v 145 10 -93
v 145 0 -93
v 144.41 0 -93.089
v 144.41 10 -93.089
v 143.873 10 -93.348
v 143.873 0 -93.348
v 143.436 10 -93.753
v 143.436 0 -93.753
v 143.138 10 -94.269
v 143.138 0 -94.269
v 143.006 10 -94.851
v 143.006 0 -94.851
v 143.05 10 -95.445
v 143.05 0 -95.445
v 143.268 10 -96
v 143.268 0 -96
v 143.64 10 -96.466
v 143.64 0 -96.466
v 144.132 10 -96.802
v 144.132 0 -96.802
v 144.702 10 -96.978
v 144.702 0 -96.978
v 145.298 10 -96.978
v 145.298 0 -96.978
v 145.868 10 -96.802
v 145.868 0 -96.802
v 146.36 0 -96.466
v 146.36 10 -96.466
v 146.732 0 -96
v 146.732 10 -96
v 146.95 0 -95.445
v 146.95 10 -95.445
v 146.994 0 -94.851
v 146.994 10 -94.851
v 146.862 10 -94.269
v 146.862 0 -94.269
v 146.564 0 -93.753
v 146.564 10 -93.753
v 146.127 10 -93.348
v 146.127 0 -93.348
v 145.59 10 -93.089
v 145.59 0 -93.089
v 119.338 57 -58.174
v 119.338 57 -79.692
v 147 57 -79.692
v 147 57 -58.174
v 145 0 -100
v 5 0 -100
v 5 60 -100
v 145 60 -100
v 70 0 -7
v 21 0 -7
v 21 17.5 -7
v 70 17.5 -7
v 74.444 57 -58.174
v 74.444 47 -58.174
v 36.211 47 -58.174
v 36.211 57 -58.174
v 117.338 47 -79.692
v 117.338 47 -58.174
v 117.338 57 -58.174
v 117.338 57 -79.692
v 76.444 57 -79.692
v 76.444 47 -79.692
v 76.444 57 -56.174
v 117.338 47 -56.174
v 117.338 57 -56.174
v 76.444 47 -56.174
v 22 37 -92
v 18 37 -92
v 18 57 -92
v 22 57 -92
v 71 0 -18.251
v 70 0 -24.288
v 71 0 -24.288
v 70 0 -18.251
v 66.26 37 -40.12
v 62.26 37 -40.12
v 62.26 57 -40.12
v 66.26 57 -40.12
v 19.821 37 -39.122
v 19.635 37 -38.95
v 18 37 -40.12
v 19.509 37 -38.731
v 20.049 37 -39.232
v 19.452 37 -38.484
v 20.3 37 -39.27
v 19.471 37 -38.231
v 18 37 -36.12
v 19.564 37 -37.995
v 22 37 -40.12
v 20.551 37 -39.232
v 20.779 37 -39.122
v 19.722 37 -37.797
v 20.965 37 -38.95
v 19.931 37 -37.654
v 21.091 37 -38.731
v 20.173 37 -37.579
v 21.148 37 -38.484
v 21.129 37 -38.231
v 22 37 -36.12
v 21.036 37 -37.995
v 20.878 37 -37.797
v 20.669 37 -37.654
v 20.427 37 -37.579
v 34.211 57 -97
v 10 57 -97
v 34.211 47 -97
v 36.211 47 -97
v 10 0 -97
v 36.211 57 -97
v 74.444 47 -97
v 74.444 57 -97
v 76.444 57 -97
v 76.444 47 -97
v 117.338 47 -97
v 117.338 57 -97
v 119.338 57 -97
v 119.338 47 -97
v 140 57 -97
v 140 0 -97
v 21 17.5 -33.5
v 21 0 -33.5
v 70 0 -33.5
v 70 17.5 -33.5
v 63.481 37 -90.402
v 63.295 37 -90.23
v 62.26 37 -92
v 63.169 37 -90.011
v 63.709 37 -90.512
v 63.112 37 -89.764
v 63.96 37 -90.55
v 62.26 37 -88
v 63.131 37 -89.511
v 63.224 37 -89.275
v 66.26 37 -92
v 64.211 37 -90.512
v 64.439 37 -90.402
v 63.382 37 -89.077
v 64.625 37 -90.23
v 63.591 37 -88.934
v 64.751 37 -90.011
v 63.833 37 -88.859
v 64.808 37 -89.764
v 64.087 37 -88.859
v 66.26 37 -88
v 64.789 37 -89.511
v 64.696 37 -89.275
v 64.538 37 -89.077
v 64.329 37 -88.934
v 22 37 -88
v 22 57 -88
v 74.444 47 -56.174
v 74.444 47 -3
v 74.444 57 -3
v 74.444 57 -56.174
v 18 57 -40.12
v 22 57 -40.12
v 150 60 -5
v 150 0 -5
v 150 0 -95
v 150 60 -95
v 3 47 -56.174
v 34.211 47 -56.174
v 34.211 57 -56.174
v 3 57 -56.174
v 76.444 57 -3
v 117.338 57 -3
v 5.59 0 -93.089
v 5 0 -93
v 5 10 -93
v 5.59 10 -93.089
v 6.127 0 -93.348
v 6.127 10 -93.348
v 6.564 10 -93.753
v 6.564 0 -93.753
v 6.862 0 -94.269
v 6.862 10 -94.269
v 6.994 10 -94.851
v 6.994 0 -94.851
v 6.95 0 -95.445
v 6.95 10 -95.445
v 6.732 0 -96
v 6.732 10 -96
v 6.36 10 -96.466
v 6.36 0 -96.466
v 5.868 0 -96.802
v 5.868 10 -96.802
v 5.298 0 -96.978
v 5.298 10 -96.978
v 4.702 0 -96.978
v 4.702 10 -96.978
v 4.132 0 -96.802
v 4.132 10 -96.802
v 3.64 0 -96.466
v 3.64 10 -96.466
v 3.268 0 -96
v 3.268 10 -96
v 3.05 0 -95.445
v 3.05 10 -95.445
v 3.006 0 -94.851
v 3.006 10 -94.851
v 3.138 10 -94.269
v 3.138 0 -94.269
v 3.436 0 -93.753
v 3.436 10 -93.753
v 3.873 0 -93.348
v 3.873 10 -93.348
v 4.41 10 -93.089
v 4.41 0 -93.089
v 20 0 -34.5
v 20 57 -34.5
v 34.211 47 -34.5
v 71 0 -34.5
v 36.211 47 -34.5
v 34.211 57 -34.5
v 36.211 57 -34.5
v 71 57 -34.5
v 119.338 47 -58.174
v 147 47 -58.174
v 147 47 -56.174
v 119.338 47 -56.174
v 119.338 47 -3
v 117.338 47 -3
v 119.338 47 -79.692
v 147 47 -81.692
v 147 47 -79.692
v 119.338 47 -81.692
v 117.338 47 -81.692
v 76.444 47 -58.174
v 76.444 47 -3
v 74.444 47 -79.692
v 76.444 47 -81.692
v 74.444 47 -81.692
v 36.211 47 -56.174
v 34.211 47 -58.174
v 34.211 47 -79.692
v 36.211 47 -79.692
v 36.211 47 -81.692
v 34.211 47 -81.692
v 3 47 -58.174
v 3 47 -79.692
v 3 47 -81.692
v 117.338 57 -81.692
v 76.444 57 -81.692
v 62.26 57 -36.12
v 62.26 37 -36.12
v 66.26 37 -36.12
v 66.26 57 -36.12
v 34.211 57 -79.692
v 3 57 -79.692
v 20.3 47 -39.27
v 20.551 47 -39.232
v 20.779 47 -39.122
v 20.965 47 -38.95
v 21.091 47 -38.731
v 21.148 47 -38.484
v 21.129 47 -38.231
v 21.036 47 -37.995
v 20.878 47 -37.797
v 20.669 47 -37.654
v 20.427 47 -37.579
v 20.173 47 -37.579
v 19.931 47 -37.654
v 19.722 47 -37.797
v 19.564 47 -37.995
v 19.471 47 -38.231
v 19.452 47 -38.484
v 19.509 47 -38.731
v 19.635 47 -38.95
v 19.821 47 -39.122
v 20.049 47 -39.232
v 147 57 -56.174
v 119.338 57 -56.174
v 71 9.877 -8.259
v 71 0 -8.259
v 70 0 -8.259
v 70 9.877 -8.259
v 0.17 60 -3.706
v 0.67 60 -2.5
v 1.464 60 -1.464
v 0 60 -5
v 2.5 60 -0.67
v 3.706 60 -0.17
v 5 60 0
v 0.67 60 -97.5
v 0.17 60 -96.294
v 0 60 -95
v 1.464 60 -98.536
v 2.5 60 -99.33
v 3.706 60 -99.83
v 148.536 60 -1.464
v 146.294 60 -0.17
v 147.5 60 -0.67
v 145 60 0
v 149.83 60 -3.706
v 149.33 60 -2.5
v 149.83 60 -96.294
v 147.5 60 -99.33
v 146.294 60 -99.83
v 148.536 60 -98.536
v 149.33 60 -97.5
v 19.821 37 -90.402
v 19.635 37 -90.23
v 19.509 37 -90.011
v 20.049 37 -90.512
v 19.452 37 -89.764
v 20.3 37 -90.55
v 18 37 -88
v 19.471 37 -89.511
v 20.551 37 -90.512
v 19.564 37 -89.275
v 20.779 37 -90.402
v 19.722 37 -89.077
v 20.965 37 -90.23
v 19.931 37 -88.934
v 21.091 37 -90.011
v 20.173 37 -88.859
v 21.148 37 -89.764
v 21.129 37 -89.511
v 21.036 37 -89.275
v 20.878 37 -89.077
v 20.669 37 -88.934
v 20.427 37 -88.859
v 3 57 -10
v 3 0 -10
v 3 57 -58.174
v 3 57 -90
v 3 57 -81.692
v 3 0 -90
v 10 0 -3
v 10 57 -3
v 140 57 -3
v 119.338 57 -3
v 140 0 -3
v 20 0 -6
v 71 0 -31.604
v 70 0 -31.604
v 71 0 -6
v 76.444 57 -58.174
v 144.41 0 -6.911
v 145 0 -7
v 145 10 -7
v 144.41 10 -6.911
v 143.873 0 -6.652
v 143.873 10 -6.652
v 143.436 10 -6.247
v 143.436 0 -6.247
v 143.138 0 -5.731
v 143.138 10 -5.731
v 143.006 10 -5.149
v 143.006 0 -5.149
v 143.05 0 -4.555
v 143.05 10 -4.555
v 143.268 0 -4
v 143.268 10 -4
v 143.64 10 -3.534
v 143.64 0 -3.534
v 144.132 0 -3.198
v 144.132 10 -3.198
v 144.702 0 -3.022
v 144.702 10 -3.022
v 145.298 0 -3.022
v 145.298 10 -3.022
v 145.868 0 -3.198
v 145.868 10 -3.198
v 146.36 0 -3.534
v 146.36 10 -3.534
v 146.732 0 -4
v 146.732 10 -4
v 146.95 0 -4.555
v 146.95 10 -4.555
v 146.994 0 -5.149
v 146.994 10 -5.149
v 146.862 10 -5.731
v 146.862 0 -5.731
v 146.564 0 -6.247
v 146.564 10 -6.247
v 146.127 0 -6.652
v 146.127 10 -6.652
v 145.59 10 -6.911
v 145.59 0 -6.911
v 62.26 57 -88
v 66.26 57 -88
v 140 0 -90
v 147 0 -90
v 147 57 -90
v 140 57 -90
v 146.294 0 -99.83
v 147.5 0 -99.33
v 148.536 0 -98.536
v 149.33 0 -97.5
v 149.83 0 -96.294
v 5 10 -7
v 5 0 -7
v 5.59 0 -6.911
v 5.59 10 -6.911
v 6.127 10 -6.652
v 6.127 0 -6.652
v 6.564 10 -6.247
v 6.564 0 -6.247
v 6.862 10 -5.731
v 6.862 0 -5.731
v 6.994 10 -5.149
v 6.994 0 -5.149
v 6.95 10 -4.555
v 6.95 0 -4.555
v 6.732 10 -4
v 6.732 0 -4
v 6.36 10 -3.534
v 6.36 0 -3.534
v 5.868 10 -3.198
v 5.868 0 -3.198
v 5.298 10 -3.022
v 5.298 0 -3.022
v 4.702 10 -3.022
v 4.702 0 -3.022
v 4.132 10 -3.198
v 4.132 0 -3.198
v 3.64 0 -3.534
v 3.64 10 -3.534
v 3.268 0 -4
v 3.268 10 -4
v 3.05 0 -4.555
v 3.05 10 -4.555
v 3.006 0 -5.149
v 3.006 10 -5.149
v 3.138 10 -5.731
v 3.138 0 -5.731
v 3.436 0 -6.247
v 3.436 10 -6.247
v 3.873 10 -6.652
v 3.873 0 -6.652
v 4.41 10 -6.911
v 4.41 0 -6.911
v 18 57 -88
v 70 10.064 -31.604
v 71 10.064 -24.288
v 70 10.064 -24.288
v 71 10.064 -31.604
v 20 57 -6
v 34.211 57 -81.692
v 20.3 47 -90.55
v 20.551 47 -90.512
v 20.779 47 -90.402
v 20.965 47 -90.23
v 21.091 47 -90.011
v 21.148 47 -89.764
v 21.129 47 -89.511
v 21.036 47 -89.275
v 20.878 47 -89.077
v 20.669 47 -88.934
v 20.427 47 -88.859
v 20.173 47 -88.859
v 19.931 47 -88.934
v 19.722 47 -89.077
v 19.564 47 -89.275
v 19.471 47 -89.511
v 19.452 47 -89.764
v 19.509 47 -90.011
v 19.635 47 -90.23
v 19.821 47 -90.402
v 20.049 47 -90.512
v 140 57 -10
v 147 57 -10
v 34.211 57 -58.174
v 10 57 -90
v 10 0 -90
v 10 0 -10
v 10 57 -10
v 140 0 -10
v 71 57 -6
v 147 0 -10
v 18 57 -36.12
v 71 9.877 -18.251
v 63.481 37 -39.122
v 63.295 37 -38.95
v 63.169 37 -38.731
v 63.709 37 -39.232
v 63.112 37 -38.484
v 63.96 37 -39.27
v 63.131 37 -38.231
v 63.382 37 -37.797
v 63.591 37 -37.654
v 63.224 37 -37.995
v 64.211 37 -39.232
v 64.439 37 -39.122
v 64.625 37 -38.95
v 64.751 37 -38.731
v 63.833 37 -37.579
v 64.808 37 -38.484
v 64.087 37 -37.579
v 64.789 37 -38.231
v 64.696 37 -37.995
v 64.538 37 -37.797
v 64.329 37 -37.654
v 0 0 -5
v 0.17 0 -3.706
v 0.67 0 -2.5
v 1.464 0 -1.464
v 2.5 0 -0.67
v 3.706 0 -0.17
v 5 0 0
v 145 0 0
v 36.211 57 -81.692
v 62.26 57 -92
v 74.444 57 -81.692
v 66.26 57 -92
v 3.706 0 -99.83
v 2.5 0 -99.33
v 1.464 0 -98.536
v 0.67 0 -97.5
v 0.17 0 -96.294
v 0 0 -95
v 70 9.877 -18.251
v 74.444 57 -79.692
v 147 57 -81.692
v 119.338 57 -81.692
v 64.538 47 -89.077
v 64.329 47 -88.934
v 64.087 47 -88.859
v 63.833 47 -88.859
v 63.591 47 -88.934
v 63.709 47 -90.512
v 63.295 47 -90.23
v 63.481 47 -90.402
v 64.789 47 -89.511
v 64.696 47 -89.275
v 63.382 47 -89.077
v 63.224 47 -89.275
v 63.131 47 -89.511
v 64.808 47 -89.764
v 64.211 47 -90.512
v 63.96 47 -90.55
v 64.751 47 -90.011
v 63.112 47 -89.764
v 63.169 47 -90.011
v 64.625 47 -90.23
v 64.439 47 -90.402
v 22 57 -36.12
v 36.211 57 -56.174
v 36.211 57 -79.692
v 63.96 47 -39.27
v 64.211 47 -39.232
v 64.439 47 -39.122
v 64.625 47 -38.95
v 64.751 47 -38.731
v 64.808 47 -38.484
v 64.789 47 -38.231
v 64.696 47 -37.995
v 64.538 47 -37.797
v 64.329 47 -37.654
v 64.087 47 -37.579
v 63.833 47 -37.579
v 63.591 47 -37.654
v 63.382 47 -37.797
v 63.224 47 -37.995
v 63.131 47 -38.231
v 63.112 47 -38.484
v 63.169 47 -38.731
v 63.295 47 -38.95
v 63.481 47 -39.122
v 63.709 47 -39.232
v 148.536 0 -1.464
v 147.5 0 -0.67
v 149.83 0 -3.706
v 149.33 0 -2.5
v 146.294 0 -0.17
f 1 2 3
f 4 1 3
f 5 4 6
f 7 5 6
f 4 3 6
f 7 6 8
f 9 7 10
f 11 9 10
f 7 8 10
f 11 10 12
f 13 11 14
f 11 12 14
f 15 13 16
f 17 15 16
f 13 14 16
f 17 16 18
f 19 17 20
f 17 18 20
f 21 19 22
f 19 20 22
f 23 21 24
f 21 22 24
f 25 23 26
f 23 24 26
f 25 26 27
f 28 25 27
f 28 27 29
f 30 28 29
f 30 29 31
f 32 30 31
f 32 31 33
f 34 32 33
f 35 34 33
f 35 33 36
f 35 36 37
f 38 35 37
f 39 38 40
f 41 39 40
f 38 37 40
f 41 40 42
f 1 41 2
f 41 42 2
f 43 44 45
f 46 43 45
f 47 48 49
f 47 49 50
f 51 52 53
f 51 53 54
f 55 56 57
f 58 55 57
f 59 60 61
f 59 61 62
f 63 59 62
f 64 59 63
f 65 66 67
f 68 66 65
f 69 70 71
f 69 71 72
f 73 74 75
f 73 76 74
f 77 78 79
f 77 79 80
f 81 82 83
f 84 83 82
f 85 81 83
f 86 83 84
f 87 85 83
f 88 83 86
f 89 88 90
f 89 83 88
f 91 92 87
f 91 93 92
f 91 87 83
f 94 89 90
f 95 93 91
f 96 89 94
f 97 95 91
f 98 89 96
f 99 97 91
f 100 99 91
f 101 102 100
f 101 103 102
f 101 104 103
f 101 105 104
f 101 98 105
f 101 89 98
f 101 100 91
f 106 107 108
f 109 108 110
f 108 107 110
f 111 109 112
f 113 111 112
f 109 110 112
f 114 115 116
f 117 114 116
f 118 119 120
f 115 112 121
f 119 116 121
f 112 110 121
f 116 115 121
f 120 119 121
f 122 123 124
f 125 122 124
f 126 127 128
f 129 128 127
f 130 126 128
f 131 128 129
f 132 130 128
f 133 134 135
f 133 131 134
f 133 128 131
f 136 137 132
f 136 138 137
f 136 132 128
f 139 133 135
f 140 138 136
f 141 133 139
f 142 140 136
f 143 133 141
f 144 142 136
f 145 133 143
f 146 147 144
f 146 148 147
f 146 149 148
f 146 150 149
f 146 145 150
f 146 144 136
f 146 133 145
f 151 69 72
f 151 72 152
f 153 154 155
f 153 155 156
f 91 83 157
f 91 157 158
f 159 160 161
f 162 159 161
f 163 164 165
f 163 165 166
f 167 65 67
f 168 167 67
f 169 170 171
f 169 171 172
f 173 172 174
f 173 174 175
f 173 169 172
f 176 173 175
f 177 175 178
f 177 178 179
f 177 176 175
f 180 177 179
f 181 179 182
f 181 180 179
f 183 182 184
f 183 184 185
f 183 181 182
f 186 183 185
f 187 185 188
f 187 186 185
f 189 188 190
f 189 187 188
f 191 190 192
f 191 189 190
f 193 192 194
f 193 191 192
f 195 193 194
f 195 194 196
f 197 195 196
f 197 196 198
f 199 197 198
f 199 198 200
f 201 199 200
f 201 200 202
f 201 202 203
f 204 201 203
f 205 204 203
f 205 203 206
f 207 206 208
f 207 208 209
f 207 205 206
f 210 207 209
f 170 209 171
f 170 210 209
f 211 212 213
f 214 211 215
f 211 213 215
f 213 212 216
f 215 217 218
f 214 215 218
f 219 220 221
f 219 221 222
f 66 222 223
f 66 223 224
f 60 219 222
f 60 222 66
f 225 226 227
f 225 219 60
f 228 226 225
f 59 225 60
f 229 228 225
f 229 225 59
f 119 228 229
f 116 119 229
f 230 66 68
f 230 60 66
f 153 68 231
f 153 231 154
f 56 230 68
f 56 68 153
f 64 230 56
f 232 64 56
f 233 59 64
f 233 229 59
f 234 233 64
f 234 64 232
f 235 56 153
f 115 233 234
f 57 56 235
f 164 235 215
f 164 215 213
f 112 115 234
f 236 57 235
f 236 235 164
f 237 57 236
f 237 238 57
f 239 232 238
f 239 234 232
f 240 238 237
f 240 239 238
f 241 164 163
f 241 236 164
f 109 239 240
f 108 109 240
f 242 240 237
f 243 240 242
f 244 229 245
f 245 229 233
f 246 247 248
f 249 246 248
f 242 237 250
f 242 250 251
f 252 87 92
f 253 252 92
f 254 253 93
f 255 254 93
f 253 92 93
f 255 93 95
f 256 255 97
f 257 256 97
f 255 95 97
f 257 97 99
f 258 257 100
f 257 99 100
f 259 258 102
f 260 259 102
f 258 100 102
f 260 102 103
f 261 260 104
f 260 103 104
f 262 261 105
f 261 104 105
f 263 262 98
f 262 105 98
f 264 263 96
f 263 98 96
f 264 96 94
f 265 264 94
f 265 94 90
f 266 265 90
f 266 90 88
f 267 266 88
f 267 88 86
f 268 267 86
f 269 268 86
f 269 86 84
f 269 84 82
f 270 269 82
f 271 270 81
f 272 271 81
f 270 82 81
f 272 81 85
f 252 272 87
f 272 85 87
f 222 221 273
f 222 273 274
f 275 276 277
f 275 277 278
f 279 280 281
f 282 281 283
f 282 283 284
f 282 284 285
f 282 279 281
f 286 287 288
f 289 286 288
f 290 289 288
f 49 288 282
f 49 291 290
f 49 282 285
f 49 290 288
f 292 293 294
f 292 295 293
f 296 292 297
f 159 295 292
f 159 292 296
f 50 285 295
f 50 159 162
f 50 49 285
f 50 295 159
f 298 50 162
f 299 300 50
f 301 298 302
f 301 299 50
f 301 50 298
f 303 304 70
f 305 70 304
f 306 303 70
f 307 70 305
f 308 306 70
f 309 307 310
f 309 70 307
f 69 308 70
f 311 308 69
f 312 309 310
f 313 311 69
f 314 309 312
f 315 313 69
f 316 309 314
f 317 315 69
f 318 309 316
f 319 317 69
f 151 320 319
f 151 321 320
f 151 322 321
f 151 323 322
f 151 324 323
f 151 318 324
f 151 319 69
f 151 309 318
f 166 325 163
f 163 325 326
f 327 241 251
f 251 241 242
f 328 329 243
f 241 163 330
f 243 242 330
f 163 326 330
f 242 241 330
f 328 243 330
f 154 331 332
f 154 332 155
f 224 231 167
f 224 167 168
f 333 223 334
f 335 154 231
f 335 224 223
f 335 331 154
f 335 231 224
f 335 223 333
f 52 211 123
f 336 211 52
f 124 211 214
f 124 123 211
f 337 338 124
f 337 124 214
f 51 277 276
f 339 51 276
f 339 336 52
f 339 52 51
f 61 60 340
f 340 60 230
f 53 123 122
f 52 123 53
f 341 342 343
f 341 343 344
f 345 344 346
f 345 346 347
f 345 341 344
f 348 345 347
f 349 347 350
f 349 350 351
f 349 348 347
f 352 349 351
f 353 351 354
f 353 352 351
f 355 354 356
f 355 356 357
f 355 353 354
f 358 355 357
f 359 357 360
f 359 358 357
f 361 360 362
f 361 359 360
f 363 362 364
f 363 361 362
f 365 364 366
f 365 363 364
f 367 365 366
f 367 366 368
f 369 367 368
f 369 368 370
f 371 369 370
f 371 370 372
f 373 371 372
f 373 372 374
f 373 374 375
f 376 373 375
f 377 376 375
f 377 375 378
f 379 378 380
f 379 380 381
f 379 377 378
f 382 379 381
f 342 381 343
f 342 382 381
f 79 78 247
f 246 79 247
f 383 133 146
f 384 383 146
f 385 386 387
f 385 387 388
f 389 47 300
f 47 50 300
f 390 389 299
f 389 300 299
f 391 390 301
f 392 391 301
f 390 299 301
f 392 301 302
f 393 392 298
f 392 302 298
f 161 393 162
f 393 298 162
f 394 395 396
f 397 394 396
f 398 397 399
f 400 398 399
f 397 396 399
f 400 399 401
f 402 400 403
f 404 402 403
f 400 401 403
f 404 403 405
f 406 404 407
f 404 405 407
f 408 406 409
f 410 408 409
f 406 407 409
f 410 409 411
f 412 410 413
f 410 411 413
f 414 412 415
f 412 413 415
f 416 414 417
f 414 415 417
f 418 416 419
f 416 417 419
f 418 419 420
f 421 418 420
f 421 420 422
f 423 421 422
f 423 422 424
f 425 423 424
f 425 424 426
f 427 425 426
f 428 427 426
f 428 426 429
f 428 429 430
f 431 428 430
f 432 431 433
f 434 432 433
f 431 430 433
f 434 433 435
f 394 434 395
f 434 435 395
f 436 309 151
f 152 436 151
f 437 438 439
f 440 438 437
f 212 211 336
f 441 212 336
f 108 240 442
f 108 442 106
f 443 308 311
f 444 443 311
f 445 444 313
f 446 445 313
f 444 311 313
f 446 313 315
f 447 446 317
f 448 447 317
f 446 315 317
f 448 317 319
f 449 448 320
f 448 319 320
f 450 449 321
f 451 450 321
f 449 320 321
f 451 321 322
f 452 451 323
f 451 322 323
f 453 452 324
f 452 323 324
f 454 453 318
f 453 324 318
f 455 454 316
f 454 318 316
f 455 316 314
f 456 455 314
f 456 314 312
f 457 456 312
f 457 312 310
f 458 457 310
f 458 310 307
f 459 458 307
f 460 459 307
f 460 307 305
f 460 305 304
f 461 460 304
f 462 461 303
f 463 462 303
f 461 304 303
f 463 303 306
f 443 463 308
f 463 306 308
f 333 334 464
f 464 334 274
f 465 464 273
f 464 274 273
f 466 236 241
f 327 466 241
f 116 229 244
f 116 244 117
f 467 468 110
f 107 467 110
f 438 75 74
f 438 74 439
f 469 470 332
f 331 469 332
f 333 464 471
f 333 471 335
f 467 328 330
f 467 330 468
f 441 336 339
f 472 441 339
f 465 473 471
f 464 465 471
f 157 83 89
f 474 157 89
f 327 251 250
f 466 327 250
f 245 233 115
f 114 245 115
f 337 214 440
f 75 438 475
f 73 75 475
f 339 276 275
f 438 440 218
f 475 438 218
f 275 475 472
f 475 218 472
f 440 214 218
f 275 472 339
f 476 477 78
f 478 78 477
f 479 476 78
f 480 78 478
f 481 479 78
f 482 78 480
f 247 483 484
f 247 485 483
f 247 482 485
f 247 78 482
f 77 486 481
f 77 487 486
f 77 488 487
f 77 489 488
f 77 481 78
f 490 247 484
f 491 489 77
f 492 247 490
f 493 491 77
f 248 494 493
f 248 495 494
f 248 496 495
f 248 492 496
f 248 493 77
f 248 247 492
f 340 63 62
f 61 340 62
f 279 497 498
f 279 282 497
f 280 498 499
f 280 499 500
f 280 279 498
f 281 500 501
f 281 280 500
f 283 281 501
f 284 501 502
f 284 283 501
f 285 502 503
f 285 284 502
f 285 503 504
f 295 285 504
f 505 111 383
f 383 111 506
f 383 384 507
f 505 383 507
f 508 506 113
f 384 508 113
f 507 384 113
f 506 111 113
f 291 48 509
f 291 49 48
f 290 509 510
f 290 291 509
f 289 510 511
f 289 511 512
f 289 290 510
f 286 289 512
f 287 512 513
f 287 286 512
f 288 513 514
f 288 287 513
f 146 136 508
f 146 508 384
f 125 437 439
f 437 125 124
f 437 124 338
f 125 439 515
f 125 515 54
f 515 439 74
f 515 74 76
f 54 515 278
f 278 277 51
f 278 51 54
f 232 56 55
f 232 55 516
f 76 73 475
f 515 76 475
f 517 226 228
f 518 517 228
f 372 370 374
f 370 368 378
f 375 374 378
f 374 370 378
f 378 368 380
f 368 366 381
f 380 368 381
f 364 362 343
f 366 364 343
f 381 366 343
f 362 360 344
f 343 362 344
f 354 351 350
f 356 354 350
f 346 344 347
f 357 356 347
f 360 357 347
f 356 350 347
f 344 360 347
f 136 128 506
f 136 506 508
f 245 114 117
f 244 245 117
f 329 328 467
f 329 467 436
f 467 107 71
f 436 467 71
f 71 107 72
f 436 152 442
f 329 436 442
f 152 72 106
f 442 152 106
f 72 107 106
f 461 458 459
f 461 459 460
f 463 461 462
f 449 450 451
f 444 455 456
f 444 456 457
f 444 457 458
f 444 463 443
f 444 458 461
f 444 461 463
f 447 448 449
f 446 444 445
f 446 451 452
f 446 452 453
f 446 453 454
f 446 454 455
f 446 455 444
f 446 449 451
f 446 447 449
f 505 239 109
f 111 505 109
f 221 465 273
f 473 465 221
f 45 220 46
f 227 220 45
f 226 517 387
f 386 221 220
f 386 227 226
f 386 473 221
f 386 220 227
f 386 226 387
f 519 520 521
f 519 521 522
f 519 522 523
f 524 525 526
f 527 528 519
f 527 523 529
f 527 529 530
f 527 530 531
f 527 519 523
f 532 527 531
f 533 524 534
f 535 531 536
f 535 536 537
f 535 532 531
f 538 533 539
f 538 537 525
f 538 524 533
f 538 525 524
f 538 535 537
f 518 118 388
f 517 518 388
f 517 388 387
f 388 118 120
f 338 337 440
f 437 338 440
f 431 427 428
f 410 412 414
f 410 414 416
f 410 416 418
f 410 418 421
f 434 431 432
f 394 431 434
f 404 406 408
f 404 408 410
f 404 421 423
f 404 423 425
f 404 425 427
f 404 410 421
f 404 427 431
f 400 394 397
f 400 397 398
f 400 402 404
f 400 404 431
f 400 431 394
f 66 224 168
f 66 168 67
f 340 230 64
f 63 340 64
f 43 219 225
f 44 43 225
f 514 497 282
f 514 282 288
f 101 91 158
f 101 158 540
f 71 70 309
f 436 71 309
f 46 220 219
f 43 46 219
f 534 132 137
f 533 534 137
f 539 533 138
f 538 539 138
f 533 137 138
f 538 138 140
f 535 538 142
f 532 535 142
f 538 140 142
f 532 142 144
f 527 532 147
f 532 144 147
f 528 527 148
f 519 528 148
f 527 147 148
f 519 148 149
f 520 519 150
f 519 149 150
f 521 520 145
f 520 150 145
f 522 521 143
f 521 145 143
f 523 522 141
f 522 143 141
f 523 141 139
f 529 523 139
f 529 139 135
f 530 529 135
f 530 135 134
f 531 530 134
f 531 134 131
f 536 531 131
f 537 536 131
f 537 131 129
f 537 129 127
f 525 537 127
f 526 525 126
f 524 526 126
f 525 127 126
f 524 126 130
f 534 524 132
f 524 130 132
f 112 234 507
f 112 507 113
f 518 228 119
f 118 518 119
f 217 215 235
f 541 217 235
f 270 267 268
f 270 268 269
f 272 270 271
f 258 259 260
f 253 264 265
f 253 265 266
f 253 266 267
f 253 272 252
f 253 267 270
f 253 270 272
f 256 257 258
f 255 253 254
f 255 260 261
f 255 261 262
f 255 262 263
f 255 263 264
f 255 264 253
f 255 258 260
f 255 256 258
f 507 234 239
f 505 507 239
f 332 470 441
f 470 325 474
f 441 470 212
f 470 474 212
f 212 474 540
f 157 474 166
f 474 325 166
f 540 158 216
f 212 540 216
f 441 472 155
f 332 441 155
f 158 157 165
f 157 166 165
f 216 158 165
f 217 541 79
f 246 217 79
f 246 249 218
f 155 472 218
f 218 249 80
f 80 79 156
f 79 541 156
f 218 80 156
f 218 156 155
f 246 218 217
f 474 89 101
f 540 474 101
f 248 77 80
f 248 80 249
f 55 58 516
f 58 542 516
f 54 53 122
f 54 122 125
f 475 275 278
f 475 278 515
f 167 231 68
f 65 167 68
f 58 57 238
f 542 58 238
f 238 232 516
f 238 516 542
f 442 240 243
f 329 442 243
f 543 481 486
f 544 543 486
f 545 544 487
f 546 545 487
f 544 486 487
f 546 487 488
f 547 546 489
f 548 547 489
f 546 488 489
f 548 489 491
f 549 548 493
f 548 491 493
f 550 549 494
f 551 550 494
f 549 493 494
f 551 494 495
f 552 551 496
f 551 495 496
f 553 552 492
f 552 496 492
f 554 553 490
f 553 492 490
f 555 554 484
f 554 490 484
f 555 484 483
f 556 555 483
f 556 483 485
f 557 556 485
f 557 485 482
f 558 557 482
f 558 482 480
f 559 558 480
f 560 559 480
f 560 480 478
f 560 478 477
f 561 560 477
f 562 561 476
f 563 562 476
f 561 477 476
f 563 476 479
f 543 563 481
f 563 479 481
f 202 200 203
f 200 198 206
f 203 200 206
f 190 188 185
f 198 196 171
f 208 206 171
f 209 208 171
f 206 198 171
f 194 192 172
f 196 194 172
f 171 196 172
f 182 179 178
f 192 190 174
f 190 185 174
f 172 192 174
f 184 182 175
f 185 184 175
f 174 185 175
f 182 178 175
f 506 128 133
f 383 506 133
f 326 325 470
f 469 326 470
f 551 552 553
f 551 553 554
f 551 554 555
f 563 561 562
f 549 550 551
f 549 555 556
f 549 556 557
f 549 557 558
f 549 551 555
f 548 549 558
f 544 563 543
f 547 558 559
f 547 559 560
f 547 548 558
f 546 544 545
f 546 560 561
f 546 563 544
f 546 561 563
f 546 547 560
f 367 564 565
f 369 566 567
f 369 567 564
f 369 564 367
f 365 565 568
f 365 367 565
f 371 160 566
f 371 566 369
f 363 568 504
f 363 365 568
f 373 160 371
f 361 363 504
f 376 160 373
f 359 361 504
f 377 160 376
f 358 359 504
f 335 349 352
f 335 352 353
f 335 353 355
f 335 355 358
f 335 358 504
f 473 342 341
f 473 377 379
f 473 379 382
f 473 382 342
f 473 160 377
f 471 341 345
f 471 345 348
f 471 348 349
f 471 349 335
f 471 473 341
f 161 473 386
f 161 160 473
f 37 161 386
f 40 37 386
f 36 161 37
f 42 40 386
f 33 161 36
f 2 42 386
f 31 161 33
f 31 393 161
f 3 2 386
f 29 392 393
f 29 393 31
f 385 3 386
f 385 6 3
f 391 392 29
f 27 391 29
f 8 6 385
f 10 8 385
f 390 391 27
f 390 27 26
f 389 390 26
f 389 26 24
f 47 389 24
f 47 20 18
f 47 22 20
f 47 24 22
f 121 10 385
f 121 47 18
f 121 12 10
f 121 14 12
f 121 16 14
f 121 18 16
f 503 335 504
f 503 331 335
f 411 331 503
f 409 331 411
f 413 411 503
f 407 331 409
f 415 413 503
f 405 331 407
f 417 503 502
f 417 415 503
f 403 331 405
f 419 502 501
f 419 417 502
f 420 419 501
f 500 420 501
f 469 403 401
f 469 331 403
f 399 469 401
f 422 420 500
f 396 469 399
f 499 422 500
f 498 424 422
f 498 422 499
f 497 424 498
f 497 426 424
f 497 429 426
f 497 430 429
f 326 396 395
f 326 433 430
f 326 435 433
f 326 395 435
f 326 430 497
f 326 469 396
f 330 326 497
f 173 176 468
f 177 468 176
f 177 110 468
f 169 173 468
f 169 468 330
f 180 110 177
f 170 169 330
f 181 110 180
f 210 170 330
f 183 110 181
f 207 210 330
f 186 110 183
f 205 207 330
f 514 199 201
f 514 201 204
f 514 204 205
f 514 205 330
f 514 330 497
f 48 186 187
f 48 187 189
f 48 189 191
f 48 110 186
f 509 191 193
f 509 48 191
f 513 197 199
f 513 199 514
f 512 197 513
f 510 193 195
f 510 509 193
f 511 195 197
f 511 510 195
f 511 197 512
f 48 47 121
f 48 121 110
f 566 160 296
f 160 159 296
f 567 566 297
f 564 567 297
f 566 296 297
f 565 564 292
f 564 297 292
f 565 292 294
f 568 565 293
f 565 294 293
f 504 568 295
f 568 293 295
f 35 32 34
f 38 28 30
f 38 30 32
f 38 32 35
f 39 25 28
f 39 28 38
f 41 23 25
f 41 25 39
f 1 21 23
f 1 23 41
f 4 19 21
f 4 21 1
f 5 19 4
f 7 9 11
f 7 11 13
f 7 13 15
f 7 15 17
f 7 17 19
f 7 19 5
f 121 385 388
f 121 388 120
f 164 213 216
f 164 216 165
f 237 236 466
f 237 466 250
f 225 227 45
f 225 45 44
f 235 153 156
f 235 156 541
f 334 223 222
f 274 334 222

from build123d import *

# Parameters (mm, degrees)
SKETCH1_W               = 150
SKETCH1_H               = 100
BOSS_EXTRUDE1_DEPTH     = 60
SHELL1_T                = -3
SKETCH2_W               = 4
SKETCH2_H               = 4
BOSS_EXTRUDE2_DEPTH     = 20
SKETCH3_R               = 0.85
CUT_EXTRUDE1_DEPTH      = 10
SKETCH4_W               = 51
SKETCH4_H               = 28.5
BOSS_EXTRUDE3_DEPTH     = 57
SKETCH5_W               = 49
SKETCH5_H               = 26.5
CUT_EXTRUDE2_DEPTH      = 17.5
SKETCH6_W               = 7.316020892
SKETCH6_H               = 10.063527081
SKETCH6_W_2             = 9.991581276
SKETCH6_H_2             = 9.876768552
CUT_EXTRUDE3_DEPTH      = 1
RIB1_REACH              = 188.304
SKETCH7_WALLS_W         = 497.226705155
SKETCH7_WALLS_H         = 2
SKETCH7_WALLS_W_2       = 2
SKETCH7_WALLS_H_2       = 447.528019614
SKETCH7_WALLS_H_3       = 446.492630332
SKETCH7_WALLS_H_4       = 428.743099781
SKETCH7_WALLS_W_3       = 498.853745456
SKETCH8_W               = 7
SKETCH8_H               = 7
BOSS_EXTRUDE4_DEPTH     = 57
MIRROR2_COPY_1_SKETCH_W = 7
MIRROR2_COPY_1_SKETCH_H = 7
MIRROR2_COPY_1_DEPTH    = 57
SKETCH9_R               = 2
CUT_EXTRUDE4_DEPTH      = 10
MIRROR4_COPY_1_SKETCH_R = 2
MIRROR4_COPY_1_DEPTH    = 10
FILLET1_R               = 5


with BuildPart() as part:
    # Sketch1 → Boss-Extrude1 (new body)
    with BuildSketch(Plane(origin=(0, 0, 0), x_dir=(1, 0, 0), z_dir=(0, 1, 0))):
        with Locations((75, 50)):
            Rectangle(SKETCH1_W, SKETCH1_H)
    extrude(amount=BOSS_EXTRUDE1_DEPTH)

    # Shell1
    shell1_openings = [part.faces().sort_by_distance(p)[0] for p in [
        (75, 0, -50),
    ]]
    offset(amount=SHELL1_T, openings=shell1_openings, kind=Kind.INTERSECTION)

    # Sketch2 → Boss-Extrude2 (add)
    with BuildSketch(Plane.XZ.offset(-57)):
        with Locations((20, -90)):
            Rectangle(SKETCH2_W, SKETCH2_H)
        with Locations((64.26, -90)):
            Rectangle(SKETCH2_W, SKETCH2_H)
        with Locations((20, -38.12)):
            Rectangle(SKETCH2_W, SKETCH2_H)
        with Locations((64.26, -38.12)):
            Rectangle(SKETCH2_W, SKETCH2_H)
    extrude(amount=BOSS_EXTRUDE2_DEPTH)

    # Sketch3 → Cut-Extrude1 (cut)
    with BuildSketch(Plane.XZ.offset(-37)):
        with Locations(Location((20.3, -89.7, 0), (0, 0, 270))):
            Circle(SKETCH3_R)
        with Locations(Location((20.3, -38.42, 0), (0, 0, 270))):
            Circle(SKETCH3_R)
        with Locations(Location((63.96, -38.42, 0), (0, 0, 270))):
            Circle(SKETCH3_R)
        with Locations(Location((63.96, -89.7, 0), (0, 0, 270))):
            Circle(SKETCH3_R)
    extrude(amount=-CUT_EXTRUDE1_DEPTH, mode=Mode.SUBTRACT)

    # Sketch4 → Boss-Extrude3 (add)
    with BuildSketch(Plane.XZ.offset(-57)):
        with Locations((45.5, -20.25)):
            Rectangle(SKETCH4_W, SKETCH4_H)
    extrude(amount=BOSS_EXTRUDE3_DEPTH)

    # Sketch5 → Cut-Extrude2 (cut)
    with BuildSketch(Plane.XZ):
        with Locations((45.5, -20.25)):
            Rectangle(SKETCH5_W, SKETCH5_H)
    extrude(amount=-CUT_EXTRUDE2_DEPTH, mode=Mode.SUBTRACT)

    # Sketch6 → Cut-Extrude3 (cut)
    with BuildSketch(Plane(origin=(71, 0, 0), x_dir=(0, 0, -1), z_dir=(1, 0, 0))):
        with Locations((27.946274495, 5.031763541)):
            Rectangle(SKETCH6_W, SKETCH6_H)
        with Locations((13.255259514, 4.938384276)):
            Rectangle(SKETCH6_W_2, SKETCH6_H_2)
    extrude(amount=-CUT_EXTRUDE3_DEPTH, mode=Mode.SUBTRACT)

    # Sketch7 walls → Rib1 (add, up to next)
    with BuildSketch(Plane(origin=(0, 47, 0), x_dir=(-1, 0, 0), z_dir=(0, -1, 0)), mode=Mode.PRIVATE) as rib1_sk1:
        with Locations((-74.334392604, 80.691896577)):
            Rectangle(SKETCH7_WALLS_W, SKETCH7_WALLS_H)
    rib1_tool1 = extrude(rib1_sk1.sketch, amount=-RIB1_REACH, mode=Mode.PRIVATE) - part.part
    # Sketch7 walls → Rib1 (add, up to next)
    with BuildSketch(Plane(origin=(0, 47, 0), x_dir=(-1, 0, 0), z_dir=(0, -1, 0)), mode=Mode.PRIVATE) as rib1_sk2:
        with Locations((-75.443738264, 51.479127546)):
            Rectangle(SKETCH7_WALLS_W_2, SKETCH7_WALLS_H_2)
    rib1_tool2 = extrude(rib1_sk2.sketch, amount=-RIB1_REACH, mode=Mode.PRIVATE) - part.part
    # Sketch7 walls → Rib1 (add, up to next)
    with BuildSketch(Plane(origin=(0, 47, 0), x_dir=(-1, 0, 0), z_dir=(0, -1, 0)), mode=Mode.PRIVATE) as rib1_sk3:
        with Locations((-118.338437094, 50.961432905)):
            Rectangle(SKETCH7_WALLS_W_2, SKETCH7_WALLS_H_3)
    rib1_tool3 = extrude(rib1_sk3.sketch, amount=-RIB1_REACH, mode=Mode.PRIVATE) - part.part
    # Sketch7 walls → Rib1 (add, up to next)
    with BuildSketch(Plane(origin=(0, 47, 0), x_dir=(-1, 0, 0), z_dir=(0, -1, 0)), mode=Mode.PRIVATE) as rib1_sk4:
        with Locations((-35.211469016, 65.01314459)):
            Rectangle(SKETCH7_WALLS_W_2, SKETCH7_WALLS_H_4)
    rib1_tool4 = extrude(rib1_sk4.sketch, amount=-RIB1_REACH, mode=Mode.PRIVATE) - part.part
    # Sketch7 walls → Rib1 (add, up to next)
    with BuildSketch(Plane(origin=(0, 47, 0), x_dir=(-1, 0, 0), z_dir=(0, -1, 0)), mode=Mode.PRIVATE) as rib1_sk5:
        with Locations((-73.520872454, 57.173768597)):
            Rectangle(SKETCH7_WALLS_W_3, SKETCH7_WALLS_H)
    rib1_tool5 = extrude(rib1_sk5.sketch, amount=-RIB1_REACH, mode=Mode.PRIVATE) - part.part
    add(rib1_tool1.solids().sort_by_distance((74.334392604, 47, -80.691896577))[0])
    add(rib1_tool2.solids().sort_by_distance((75.443738264, 47, -51.479127546))[0])
    add(rib1_tool3.solids().sort_by_distance((118.338437094, 47, -50.961432905))[0])
    add(rib1_tool4.solids().sort_by_distance((35.211469016, 47, -65.01314459))[0])
    add(rib1_tool5.solids().sort_by_distance((73.520872454, 47, -57.173768597))[0])

    # Sketch8 → Boss-Extrude4 (add)
    with BuildSketch(Plane.XZ.offset(-57)):
        with Locations((6.5, -6.5)):
            Rectangle(SKETCH8_W, SKETCH8_H)
    boss_extrude4 = extrude(amount=BOSS_EXTRUDE4_DEPTH)

    # Mirror1: Boss-Extrude4 across plane
    add(boss_extrude4.mirror(Plane.XY.offset(-50)))

    # Mirror2: Boss-Extrude4 across plane
    add(boss_extrude4.mirror(Plane.ZY.offset(-75)))

    # Mirror2 copy 1 sketch → Mirror2 copy 1 (add)
    with BuildSketch(Plane(origin=(150, 57, -100), x_dir=(-1, 0, 0), z_dir=(0, -1, 0))):
        with Locations((6.5, -6.5)):
            Rectangle(MIRROR2_COPY_1_SKETCH_W, MIRROR2_COPY_1_SKETCH_H)
    extrude(amount=MIRROR2_COPY_1_DEPTH)

    # Sketch9 → Cut-Extrude4 (cut)
    with BuildSketch(Plane.XZ):
        with Locations(Location((5, -5, 0), (0, 0, 270))):
            Circle(SKETCH9_R)
    cut_extrude4 = extrude(amount=-CUT_EXTRUDE4_DEPTH, mode=Mode.SUBTRACT)

    # Mirror3: Cut-Extrude4 across plane
    add(cut_extrude4.mirror(Plane.XY.offset(-50)), mode=Mode.SUBTRACT)

    # Mirror4: Cut-Extrude4 across plane
    add(cut_extrude4.mirror(Plane.ZY.offset(-75)), mode=Mode.SUBTRACT)

    # Mirror4 copy 1 sketch → Mirror4 copy 1 (cut)
    with BuildSketch(Plane(origin=(150, 0, -100), x_dir=(-1, 0, 0), z_dir=(0, -1, 0))):
        with Locations(Location((5, -5, 0), (0, 0, 270))):
            Circle(MIRROR4_COPY_1_SKETCH_R)
    extrude(amount=-MIRROR4_COPY_1_DEPTH, mode=Mode.SUBTRACT)

    # Fillet1
    fillet1_edges = [part.edges().sort_by_distance(p)[0] for p in [
        (0, 30, -100),
        (150, 30, -100),
        (150, 30, 0),
        (0, 30, 0),
    ]]
    fillet(fillet1_edges, radius=FILLET1_R)


solid = part.part
